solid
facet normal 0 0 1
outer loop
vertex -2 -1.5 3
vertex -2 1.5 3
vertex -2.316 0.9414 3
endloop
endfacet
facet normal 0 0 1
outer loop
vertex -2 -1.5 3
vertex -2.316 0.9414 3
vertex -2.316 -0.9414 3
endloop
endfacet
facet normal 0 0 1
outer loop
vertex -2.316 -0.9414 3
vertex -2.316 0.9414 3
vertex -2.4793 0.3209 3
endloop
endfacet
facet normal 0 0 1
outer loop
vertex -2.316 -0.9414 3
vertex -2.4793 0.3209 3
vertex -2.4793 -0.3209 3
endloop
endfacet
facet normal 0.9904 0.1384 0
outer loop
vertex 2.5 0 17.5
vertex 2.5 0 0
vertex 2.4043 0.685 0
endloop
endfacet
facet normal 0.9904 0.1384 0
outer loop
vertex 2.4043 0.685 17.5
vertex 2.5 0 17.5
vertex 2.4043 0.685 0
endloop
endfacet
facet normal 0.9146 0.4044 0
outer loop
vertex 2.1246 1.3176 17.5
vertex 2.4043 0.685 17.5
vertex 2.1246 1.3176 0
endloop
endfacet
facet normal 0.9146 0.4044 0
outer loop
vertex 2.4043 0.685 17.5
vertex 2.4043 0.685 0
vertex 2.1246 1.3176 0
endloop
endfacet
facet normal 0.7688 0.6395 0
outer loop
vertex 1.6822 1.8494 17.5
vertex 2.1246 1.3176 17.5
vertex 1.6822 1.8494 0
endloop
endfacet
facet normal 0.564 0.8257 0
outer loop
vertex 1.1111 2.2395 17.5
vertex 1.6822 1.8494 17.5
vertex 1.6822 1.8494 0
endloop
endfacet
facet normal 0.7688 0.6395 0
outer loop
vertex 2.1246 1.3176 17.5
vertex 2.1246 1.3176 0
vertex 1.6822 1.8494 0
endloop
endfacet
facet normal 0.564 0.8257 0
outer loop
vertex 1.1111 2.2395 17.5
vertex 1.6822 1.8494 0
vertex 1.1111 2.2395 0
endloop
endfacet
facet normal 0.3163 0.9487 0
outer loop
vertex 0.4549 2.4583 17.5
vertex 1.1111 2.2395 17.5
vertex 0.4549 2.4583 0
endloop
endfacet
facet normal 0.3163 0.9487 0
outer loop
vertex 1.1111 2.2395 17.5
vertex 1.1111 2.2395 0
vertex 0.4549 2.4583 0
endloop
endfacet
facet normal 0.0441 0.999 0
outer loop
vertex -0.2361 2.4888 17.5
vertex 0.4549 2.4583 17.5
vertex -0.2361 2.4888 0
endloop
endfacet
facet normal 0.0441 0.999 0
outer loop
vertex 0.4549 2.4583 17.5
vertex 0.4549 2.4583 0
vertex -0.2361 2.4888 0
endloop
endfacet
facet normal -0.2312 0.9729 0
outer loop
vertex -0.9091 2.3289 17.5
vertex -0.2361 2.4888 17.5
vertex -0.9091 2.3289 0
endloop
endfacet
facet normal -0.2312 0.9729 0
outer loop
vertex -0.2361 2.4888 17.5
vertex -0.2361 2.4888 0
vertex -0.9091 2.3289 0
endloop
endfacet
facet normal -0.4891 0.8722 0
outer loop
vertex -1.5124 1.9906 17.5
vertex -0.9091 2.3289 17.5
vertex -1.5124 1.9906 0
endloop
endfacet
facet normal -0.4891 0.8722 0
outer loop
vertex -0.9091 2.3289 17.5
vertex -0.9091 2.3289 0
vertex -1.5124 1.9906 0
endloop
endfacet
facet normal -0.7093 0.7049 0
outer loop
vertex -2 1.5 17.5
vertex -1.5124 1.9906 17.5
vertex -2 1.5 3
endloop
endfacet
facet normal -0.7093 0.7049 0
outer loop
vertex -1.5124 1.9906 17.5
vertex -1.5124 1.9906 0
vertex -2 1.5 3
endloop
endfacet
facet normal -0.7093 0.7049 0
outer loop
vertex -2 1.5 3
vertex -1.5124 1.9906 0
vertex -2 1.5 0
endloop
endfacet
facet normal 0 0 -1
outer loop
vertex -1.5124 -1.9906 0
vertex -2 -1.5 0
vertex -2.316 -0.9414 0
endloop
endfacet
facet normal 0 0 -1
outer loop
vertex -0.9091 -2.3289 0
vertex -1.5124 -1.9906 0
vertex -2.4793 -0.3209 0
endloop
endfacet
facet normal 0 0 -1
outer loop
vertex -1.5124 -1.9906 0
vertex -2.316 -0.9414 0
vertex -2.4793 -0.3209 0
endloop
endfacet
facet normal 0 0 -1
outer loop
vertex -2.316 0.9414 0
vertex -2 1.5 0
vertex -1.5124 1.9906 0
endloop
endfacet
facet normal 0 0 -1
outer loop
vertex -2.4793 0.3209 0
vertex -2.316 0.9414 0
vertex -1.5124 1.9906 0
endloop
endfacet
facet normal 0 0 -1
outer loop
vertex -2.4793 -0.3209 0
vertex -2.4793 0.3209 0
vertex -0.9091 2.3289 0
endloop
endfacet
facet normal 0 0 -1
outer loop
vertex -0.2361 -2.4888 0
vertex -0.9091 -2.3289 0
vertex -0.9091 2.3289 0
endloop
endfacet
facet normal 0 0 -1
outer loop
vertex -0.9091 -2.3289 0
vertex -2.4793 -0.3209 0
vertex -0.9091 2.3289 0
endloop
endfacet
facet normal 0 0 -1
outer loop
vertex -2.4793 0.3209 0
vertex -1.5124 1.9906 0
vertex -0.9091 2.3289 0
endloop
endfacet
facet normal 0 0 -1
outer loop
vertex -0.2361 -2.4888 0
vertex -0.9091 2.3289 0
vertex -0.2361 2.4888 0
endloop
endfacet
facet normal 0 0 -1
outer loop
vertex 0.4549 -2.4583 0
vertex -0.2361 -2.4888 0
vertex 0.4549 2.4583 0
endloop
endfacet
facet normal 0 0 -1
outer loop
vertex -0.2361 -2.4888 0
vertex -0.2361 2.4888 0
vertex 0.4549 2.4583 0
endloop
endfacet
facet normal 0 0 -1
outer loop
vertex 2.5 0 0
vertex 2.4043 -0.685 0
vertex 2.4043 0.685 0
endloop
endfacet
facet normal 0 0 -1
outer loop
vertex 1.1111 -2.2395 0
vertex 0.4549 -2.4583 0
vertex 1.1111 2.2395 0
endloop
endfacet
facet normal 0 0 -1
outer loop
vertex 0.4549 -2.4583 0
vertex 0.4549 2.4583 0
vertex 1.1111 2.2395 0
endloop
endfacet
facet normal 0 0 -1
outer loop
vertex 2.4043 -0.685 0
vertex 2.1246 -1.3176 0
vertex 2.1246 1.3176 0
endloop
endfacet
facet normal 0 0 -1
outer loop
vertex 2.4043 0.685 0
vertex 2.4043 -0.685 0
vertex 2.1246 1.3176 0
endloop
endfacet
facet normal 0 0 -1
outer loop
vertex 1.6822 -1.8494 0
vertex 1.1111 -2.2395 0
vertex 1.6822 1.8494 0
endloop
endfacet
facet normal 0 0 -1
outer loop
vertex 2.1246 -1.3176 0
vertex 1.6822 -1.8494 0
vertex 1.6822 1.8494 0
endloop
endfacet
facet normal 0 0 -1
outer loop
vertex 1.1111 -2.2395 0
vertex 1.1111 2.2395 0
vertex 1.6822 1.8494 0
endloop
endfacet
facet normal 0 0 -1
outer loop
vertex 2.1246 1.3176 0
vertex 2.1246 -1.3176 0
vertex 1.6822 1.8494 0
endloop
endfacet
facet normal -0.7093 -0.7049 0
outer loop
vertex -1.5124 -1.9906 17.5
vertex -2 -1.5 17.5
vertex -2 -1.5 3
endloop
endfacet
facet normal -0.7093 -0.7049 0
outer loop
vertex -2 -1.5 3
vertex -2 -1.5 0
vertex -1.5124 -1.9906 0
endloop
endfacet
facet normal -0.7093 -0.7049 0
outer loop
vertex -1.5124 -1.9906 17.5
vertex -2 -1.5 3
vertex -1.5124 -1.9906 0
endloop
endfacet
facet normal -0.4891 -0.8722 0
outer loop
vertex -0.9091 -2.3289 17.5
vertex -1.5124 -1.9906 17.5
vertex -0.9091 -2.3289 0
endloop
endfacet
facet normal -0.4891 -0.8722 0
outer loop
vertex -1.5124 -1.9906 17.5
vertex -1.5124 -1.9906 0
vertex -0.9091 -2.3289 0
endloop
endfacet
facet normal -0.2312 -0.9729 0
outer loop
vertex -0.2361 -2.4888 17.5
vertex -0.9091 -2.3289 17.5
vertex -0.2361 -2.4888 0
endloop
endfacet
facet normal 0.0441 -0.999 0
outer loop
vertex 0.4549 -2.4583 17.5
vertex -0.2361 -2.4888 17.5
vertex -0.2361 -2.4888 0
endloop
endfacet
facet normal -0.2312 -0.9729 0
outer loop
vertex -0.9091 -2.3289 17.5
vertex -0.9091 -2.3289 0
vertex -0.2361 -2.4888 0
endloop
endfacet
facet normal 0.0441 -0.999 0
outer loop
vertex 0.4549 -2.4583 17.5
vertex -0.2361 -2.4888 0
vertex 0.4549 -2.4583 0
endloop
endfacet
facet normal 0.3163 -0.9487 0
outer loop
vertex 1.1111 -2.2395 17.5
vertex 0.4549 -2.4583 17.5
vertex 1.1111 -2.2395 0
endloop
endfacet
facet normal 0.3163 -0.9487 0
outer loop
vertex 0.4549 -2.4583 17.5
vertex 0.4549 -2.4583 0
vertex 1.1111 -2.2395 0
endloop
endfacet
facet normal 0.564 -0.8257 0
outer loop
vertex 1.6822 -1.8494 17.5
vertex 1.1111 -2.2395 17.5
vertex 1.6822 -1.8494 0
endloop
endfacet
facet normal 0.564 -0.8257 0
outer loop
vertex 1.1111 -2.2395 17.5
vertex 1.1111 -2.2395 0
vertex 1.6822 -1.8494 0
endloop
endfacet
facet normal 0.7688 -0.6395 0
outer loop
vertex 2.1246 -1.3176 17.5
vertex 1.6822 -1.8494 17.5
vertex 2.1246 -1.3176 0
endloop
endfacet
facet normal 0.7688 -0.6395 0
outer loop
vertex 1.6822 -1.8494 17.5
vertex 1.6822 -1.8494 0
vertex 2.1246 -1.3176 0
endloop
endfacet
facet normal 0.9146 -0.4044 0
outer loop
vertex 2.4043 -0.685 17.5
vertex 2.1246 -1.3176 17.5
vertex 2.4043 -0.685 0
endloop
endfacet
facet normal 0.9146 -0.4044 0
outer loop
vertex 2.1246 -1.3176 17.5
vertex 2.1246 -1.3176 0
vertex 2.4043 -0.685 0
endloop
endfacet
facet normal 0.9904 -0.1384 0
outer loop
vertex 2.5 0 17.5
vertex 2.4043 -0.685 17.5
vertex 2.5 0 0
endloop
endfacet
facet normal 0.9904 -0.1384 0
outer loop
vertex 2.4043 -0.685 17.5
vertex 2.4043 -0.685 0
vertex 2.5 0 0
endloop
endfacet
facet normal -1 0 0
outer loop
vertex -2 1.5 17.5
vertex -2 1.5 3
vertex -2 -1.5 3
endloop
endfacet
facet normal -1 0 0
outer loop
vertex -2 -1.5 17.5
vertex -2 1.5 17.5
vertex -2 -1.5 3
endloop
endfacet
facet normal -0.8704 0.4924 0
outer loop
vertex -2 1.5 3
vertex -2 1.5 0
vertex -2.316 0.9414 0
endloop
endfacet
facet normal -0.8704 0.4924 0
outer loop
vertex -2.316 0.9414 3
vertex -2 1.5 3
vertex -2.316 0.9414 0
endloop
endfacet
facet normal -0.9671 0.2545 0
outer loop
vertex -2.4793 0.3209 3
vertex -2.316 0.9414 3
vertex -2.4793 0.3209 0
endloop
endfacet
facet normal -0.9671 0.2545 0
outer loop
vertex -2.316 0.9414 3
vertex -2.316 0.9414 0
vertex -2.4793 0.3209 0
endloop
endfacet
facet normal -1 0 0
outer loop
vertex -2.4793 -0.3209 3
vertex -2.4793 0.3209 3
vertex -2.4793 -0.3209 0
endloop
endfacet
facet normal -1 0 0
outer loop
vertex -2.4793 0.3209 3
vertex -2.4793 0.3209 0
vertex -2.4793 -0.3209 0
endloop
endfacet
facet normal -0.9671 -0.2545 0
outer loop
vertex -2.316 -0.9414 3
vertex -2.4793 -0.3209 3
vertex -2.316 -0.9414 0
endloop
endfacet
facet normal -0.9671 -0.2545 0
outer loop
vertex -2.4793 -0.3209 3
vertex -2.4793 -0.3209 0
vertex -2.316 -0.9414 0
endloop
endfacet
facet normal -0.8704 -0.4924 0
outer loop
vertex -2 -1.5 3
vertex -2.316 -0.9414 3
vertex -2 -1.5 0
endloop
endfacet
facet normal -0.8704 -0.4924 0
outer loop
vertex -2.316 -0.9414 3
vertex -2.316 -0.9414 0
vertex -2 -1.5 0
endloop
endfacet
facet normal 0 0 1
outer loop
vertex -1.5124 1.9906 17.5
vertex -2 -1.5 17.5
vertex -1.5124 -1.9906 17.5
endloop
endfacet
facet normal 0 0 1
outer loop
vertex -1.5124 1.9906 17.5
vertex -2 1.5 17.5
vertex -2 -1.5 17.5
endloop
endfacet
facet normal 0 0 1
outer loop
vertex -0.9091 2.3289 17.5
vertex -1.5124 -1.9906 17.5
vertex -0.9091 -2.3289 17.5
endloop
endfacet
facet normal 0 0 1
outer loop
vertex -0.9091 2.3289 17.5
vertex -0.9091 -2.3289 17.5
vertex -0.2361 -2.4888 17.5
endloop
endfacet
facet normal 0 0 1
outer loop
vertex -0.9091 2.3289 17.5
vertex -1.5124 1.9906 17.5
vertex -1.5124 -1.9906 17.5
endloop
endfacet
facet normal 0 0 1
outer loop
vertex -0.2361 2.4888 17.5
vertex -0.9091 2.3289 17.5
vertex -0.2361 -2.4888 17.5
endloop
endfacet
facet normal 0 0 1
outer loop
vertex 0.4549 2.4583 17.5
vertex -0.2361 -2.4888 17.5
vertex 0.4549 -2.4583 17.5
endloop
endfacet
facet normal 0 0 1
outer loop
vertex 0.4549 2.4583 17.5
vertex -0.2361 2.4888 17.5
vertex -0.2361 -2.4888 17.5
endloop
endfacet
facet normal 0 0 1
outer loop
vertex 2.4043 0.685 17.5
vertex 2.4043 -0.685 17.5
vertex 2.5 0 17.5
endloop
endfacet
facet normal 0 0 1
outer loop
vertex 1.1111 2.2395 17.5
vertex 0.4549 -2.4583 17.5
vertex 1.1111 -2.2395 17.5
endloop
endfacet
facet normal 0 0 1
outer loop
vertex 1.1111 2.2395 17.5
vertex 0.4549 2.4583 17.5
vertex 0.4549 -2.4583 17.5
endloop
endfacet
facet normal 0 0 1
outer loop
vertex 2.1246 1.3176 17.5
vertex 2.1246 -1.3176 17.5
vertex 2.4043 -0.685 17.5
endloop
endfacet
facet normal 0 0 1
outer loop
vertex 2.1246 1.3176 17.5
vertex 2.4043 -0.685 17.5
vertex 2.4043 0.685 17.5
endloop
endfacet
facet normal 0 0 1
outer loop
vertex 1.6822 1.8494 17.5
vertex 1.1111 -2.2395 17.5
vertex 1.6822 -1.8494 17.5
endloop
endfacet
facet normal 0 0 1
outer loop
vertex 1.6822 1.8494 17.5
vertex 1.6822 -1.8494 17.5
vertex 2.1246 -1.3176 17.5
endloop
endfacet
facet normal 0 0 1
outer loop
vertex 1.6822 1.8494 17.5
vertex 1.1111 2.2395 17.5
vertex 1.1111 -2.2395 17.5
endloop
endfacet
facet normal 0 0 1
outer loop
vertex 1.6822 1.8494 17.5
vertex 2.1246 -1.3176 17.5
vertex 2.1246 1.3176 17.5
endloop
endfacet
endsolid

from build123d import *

# Parameters (mm, degrees)
F1_DEPTH = 17.5
F2_DEPTH = 3


with BuildPart() as f1:
    # F0 (on Top) → F1 (new body)
    with BuildSketch(Plane.XY):
        with BuildLine():
            ThreePointArc((-2, -1.5), (0.790569, -2.371708), (2.5, 0))
            ThreePointArc((2.5, 0), (0.790569, 2.371708), (-2, 1.5))
            Line((-2, 1.5), (-2, -1.5))
        make_face()
    extrude(amount=F1_DEPTH)

    # F0 (on Top) → F2 (join)
    with BuildSketch(Plane.XY):
        with BuildLine():
            Line((-2, -1.5), (-2, 1.5))
            ThreePointArc((-2, 1.5), (-2.5, 0), (-2, -1.5))
        make_face()
    extrude(amount=F2_DEPTH)


solid = f1.part
